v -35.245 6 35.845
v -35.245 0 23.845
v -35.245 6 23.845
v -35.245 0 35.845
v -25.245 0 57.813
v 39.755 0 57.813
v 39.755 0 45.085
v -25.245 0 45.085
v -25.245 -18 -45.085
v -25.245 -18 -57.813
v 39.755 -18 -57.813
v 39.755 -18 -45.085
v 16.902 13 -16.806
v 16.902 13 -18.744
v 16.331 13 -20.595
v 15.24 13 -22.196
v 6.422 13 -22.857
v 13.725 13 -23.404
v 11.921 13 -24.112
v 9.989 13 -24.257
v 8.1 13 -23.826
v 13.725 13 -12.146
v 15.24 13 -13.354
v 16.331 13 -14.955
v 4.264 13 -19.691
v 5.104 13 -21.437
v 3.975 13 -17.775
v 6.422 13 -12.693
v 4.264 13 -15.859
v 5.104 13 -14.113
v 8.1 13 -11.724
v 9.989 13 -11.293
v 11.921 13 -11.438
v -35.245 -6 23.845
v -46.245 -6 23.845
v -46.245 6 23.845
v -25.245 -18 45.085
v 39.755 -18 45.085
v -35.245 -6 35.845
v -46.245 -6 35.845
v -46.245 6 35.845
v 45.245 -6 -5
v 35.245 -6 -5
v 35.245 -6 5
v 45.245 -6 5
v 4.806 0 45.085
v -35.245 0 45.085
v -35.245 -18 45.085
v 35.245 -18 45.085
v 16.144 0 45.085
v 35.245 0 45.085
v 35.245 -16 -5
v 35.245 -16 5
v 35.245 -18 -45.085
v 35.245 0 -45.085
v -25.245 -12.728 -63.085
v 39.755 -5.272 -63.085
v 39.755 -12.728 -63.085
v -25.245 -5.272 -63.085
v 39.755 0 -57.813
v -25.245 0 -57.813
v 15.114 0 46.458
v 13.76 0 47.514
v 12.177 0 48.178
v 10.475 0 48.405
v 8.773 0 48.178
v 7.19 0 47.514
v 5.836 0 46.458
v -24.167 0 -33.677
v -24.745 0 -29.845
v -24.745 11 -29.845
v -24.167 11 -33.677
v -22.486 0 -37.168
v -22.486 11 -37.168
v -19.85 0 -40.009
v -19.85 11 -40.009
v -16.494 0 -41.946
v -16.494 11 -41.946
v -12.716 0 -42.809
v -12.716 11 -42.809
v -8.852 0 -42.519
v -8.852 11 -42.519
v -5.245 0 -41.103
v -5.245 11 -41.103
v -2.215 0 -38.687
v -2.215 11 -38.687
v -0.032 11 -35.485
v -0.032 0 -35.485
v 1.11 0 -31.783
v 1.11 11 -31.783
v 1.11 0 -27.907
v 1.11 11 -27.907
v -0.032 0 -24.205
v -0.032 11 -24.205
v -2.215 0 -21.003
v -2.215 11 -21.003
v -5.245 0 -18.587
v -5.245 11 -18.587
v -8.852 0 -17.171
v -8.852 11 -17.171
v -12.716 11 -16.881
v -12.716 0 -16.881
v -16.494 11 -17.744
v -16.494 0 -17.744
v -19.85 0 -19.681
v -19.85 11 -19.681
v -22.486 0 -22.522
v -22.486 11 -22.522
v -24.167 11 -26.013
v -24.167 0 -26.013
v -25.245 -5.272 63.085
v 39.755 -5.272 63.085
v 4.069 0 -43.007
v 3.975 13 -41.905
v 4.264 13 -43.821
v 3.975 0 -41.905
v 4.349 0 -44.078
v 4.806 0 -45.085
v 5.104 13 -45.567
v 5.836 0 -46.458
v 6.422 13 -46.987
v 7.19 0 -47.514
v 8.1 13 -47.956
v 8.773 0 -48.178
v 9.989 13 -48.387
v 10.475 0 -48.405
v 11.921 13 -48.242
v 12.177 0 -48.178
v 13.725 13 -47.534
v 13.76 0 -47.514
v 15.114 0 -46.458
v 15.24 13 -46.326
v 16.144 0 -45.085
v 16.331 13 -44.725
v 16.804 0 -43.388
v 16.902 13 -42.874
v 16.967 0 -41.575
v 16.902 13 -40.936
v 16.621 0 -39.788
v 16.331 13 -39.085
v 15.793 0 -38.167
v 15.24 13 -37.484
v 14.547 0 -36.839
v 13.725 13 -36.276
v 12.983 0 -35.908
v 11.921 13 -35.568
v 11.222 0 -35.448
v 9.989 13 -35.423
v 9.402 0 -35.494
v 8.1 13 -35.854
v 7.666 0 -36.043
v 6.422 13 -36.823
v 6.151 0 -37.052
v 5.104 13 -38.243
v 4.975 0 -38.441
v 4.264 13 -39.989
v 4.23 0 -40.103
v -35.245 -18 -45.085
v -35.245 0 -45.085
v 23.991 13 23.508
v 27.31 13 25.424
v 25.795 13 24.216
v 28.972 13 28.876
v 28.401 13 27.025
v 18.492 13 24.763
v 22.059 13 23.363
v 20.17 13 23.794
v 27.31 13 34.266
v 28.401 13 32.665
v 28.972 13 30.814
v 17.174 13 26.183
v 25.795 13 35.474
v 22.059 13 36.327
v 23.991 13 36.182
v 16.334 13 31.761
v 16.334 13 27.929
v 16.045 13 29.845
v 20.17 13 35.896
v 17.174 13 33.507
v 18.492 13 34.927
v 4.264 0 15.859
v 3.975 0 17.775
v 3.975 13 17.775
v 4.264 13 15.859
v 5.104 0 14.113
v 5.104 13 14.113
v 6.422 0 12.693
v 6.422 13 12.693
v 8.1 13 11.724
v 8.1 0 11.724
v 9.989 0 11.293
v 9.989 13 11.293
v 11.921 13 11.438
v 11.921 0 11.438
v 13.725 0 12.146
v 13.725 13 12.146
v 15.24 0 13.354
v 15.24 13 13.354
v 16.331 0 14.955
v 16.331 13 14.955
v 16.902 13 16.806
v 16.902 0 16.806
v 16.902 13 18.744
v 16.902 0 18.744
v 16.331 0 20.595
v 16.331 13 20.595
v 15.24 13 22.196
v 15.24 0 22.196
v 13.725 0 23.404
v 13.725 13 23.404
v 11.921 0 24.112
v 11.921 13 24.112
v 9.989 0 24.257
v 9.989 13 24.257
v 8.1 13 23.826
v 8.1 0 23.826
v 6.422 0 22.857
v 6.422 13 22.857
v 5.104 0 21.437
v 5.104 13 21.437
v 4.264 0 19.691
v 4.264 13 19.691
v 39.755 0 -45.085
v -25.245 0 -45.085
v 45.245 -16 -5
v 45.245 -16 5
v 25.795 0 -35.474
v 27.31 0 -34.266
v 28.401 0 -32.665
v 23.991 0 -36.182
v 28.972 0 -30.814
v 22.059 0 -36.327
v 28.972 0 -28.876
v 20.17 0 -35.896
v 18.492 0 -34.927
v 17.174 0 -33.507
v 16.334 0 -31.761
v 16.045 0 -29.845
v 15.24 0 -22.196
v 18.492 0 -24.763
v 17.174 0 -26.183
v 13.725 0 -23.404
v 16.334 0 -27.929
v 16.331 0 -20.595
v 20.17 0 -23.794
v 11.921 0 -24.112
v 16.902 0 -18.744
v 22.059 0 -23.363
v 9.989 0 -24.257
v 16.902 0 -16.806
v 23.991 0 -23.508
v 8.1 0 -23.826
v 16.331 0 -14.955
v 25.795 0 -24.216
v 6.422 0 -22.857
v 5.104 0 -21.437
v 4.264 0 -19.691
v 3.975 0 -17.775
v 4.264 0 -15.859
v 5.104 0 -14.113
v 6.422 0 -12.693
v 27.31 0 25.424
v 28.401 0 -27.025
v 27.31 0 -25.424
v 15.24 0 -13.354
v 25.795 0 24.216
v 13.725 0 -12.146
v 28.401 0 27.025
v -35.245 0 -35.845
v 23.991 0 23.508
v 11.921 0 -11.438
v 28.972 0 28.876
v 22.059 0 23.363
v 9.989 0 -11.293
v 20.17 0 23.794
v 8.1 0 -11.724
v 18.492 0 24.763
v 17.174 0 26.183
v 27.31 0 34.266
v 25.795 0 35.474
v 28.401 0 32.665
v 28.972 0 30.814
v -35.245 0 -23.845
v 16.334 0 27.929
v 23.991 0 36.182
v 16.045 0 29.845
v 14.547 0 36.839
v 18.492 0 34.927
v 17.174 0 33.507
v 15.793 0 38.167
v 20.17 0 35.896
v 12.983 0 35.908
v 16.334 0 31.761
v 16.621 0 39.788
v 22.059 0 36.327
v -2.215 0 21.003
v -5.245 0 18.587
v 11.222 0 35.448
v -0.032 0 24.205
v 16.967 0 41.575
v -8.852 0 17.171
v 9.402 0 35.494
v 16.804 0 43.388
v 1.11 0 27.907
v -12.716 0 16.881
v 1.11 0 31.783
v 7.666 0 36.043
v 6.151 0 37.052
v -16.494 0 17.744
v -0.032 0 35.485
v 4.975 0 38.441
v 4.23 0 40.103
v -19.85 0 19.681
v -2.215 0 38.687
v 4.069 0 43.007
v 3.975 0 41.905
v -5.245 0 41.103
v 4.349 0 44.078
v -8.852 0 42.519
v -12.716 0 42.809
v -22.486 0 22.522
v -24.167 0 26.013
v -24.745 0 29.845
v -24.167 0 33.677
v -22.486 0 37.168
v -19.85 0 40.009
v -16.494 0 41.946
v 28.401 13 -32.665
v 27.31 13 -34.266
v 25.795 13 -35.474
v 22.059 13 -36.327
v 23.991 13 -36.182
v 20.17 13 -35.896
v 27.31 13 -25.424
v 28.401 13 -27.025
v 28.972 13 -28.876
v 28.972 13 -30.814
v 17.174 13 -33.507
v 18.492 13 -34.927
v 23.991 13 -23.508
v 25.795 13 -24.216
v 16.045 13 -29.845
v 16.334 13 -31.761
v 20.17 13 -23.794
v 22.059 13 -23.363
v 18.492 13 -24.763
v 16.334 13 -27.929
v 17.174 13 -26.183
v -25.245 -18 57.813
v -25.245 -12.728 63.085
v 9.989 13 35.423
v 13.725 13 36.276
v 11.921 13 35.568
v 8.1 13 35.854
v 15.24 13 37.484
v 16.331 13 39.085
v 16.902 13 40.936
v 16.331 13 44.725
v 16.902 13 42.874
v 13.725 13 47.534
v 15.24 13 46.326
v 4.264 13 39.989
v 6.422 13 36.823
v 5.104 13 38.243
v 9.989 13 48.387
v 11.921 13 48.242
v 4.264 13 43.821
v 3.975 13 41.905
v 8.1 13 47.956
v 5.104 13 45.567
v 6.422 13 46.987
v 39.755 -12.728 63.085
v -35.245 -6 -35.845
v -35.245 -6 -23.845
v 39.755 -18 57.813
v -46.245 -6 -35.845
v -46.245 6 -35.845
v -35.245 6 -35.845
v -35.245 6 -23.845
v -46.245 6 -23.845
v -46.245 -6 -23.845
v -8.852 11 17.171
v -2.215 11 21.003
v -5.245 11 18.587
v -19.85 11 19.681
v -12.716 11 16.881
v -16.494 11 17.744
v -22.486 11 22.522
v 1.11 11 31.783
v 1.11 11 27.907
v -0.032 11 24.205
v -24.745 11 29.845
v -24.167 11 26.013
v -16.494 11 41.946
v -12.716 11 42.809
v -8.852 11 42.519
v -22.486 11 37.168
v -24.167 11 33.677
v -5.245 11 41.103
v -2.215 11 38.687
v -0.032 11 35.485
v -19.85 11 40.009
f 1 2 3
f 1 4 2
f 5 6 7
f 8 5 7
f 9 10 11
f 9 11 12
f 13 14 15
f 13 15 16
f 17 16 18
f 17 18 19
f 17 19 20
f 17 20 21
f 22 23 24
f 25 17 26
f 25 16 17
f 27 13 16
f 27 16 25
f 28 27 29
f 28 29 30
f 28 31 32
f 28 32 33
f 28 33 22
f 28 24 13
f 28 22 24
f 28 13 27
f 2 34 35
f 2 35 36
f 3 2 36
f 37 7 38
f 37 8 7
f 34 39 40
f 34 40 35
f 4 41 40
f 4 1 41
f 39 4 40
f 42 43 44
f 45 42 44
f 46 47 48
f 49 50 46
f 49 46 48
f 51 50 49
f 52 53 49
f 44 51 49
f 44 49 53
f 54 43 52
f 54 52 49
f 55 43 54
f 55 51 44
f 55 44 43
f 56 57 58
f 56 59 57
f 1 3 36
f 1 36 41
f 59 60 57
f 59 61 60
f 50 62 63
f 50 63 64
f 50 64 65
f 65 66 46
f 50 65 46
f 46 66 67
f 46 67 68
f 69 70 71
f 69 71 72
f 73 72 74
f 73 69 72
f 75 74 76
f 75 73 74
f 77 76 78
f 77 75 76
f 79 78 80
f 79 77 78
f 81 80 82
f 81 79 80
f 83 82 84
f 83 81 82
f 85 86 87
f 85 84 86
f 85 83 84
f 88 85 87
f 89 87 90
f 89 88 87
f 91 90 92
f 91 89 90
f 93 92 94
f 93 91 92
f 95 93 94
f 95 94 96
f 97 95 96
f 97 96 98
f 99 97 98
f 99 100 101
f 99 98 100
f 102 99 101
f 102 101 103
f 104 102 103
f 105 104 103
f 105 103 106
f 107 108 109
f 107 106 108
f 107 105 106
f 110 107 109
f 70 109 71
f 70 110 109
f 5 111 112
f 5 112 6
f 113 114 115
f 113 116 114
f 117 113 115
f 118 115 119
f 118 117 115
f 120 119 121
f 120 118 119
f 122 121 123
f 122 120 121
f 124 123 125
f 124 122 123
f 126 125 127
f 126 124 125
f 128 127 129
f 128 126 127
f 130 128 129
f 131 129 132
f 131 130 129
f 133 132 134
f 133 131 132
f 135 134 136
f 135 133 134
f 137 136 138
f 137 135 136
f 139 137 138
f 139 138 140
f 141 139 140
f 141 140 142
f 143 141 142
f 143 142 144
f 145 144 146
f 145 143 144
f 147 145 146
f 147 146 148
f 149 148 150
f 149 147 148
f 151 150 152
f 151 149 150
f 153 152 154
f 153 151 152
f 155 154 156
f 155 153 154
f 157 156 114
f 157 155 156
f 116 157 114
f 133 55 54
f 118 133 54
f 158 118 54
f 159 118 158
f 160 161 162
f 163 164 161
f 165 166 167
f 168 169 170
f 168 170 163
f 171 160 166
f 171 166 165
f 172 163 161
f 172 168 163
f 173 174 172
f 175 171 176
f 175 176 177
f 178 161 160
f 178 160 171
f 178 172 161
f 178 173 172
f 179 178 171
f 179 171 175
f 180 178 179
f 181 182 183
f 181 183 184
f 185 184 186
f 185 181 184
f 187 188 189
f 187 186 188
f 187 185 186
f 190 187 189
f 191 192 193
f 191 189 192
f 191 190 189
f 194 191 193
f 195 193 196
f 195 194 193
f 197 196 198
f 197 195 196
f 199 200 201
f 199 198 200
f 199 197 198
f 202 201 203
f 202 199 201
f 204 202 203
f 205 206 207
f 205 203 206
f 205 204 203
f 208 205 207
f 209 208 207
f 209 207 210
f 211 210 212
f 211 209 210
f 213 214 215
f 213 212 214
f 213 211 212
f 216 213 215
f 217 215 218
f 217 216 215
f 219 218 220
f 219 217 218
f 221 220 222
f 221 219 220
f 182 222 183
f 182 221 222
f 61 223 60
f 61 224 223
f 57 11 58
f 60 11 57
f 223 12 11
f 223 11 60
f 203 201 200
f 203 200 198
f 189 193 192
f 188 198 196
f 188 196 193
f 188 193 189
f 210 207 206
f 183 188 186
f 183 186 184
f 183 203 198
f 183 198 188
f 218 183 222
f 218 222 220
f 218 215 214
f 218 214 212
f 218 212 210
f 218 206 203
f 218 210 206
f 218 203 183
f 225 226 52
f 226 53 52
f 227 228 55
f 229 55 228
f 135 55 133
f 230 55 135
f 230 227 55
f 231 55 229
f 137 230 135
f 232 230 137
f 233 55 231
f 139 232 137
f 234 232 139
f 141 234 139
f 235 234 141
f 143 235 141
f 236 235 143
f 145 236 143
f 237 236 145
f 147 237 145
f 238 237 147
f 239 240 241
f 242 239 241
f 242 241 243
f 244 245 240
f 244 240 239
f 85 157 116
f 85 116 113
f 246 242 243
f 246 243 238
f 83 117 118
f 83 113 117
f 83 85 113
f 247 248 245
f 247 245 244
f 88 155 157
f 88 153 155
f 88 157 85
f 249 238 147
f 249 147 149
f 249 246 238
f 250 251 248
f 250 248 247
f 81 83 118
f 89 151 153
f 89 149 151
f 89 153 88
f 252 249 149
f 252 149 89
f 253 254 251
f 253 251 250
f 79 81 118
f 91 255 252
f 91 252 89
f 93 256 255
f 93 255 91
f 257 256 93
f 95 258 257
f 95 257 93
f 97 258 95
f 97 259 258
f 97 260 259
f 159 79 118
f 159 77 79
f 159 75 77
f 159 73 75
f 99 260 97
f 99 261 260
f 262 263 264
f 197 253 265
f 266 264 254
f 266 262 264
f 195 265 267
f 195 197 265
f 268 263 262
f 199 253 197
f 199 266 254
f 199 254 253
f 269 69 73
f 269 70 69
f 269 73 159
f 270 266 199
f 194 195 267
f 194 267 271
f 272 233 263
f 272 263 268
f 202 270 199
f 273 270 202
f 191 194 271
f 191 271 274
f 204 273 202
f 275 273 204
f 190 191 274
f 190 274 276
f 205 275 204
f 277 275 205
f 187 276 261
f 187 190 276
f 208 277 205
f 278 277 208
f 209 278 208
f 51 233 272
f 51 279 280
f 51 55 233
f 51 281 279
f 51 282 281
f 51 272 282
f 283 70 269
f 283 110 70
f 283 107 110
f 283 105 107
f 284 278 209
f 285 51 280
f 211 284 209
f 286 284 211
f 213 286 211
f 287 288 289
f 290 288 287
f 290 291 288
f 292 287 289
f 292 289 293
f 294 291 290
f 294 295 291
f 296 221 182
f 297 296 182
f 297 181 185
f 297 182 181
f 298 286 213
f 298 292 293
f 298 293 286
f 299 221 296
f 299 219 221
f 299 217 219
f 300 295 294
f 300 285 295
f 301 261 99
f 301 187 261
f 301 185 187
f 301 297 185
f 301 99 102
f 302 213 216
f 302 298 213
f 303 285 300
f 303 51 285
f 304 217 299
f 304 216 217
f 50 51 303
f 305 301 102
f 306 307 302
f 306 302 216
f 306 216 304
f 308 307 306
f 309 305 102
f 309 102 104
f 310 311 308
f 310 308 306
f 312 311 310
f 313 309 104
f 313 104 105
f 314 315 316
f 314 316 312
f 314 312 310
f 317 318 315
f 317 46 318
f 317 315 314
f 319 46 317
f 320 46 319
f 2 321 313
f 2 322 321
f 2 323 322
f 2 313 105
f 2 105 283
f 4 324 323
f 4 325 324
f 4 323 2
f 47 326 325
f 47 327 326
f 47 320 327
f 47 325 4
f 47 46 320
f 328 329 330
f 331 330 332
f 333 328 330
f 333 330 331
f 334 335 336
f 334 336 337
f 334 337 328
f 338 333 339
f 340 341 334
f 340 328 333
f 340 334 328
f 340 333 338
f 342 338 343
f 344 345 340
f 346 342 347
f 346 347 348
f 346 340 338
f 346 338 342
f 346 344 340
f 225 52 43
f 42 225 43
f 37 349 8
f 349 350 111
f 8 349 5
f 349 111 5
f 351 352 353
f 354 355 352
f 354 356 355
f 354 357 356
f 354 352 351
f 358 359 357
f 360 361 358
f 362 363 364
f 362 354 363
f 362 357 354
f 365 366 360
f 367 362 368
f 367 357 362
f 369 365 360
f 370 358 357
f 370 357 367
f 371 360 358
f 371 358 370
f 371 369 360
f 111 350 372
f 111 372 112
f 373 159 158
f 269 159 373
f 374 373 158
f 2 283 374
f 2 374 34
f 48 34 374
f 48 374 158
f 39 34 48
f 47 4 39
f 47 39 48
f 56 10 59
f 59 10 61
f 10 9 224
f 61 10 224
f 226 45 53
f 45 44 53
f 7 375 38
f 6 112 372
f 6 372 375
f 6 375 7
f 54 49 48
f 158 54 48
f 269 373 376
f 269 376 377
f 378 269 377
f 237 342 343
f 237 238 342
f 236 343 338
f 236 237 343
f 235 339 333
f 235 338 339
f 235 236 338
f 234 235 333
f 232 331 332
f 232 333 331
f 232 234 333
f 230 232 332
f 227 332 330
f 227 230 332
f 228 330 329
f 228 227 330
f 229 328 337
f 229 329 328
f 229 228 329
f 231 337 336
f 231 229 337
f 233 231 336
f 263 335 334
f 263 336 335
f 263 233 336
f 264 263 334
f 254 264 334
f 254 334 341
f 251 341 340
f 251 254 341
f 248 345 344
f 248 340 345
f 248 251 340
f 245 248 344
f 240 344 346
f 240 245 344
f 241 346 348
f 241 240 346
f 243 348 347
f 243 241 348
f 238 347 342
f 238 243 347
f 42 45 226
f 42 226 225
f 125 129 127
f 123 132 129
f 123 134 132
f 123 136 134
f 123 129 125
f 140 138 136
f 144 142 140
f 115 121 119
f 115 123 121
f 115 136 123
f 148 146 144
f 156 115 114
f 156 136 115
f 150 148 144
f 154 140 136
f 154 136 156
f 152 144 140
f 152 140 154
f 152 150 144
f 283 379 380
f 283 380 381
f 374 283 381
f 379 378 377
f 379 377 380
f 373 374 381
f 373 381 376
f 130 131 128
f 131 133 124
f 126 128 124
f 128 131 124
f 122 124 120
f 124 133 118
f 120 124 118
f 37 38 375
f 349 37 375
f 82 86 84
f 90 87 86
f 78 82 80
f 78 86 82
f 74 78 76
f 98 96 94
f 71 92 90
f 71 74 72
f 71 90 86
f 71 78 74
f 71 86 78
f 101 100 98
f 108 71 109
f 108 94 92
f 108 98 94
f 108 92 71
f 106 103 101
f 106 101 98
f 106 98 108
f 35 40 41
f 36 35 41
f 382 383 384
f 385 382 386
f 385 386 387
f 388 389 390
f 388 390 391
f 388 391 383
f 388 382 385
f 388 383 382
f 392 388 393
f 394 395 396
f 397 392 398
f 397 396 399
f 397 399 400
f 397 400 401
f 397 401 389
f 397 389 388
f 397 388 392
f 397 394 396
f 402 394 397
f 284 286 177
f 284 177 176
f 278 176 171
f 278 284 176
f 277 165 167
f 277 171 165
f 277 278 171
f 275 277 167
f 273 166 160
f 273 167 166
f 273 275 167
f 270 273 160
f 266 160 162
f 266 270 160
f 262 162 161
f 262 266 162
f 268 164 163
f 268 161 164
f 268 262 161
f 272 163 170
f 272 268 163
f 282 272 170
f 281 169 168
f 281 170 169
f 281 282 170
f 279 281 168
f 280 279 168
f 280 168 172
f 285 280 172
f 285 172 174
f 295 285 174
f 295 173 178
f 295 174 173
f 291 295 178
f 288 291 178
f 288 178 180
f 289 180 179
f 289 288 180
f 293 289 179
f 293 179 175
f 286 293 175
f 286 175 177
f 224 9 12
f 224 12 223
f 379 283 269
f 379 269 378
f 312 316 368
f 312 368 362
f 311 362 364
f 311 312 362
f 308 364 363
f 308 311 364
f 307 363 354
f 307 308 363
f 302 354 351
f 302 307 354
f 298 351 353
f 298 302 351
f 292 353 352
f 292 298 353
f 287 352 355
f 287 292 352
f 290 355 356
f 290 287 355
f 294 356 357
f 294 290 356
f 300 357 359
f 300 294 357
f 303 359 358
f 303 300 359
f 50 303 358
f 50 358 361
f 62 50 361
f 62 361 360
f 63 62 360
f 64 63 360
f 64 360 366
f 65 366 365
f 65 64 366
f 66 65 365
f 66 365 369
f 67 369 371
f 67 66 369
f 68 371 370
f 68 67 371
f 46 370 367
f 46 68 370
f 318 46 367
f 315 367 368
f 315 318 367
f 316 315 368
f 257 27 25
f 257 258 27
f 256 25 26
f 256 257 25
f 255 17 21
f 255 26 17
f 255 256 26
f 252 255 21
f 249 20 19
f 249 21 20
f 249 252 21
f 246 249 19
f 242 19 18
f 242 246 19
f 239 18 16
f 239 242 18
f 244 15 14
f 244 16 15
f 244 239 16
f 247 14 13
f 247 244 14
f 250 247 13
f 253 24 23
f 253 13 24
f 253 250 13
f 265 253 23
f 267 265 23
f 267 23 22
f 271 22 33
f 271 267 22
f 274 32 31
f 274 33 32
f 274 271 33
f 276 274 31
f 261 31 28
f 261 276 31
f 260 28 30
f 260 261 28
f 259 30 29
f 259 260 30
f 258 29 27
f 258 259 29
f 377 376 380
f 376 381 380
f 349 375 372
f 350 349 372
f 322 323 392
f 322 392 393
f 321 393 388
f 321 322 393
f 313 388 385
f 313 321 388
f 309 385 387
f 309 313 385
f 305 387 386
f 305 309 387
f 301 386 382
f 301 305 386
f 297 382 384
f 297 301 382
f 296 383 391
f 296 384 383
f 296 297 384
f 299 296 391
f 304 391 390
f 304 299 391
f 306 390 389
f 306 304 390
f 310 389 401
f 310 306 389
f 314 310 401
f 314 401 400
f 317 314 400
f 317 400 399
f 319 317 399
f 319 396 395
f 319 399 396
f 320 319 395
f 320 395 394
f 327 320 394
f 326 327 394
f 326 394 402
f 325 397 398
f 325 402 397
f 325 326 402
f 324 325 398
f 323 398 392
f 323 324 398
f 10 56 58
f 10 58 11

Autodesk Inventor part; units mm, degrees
ref_plane "XY Plane" through (0, 0, 0) normal (0, 0, 1) x (1, 0, 0)
sketch "Sketch1" plane through (0, 0, 0) normal (0, 1, 0) x (-1, 0, 0)
  line L0 (35.245, 45.085) -> (-35.245, 45.085)
  line L1 (-35.245, 45.085) -> (-35.245, -45.085)
  line L2 (-35.245, -45.085) -> (35.245, -45.085)
  line L3 (35.245, -45.085) -> (35.245, 45.085)
  circle A0 centre (11.745, 29.845) radius 13
  circle A1 centre (11.745, -29.845) radius 13
  line L4 (-10.475, 45.085) -> (-10.475, -45.085) construction
  circle A2 centre (-10.475, 41.905) radius 6.5
  circle A3 centre (-10.475, 17.775) radius 6.5
  circle A4 centre (-10.475, -17.775) radius 6.5
  circle A5 centre (-10.475, -41.905) radius 6.5
  circle A6 centre (-22.545, 29.845) radius 6.5
  circle A7 centre (-22.545, -29.845) radius 6.5
  point P0 (0, 0)
  dimension "d0" = 90.17
  dimension "d1" = 45.085
  dimension "d2" = 35.245
  dimension "d3" = 70.49
  dimension "d4" = 15.24
  dimension "d5" = 15.24
  dimension "d6" = 23.5
  dimension "d7" = 23.5
  dimension "d8" = 26
  dimension "d9" = 26
  dimension "d10" = 45.72
  dimension "d11" = 13
  dimension "d12" = 13
  dimension "d13" = 13
  dimension "d14" = 13
  dimension "d15" = 3.18
  dimension "d16" = 3.18
  dimension "d17" = 24.13
  dimension "d18" = 24.13
  dimension "d19" = 13
  dimension "d20" = 12.07
  dimension "d21" = 12.07
  dimension "d22" = 0
  dimension "d23" = 0
  dimension "d24" = 13
extrude "Extrusion1" add sketch "Sketch1" along normal blind 11 contours A0 | A1
sketch "Sketch2" plane through (0, 0, 0) normal (0, 1, 0) x (-1, 0, 0)
  line L0 (35.245, 45.085) -> (-35.245, 45.085)
  line L1 (-35.245, 45.085) -> (-35.245, -45.085)
  line L2 (-35.245, -45.085) -> (35.245, -45.085)
  line L3 (35.245, -45.085) -> (35.245, 45.085)
  circle A0 centre (11.745, 29.845) radius 13
  circle A1 centre (11.745, -29.845) radius 13
  line L4 (-10.475, 45.085) -> (-10.475, -45.085) construction
  circle A2 centre (-10.475, 41.905) radius 6.5
  circle A3 centre (-10.475, 17.775) radius 6.5
  circle A4 centre (-10.475, -17.775) radius 6.5
  circle A5 centre (-10.475, -41.905) radius 6.5
  circle A6 centre (-22.545, 29.845) radius 6.5
  circle A7 centre (-22.545, -29.845) radius 6.5
  point P0 (0, 0)
  dimension "d27" = 90.17
  dimension "d28" = 45.085
  dimension "d29" = 35.245
  dimension "d30" = 70.49
  dimension "d31" = 15.24
  dimension "d32" = 15.24
  dimension "d33" = 23.5
  dimension "d34" = 23.5
  dimension "d35" = 26
  dimension "d36" = 26
  dimension "d37" = 45.72
  dimension "d38" = 13
  dimension "d39" = 13
  dimension "d40" = 13
  dimension "d41" = 13
  dimension "d42" = 3.18
  dimension "d43" = 3.18
  dimension "d44" = 24.13
  dimension "d45" = 24.13
  dimension "d46" = 13
  dimension "d47" = 12.07
  dimension "d48" = 12.07
  dimension "d49" = 0
  dimension "d50" = 0
  dimension "d51" = 13
extrude "Extrusion2" add sketch "Sketch2" along normal blind 7 contours A2 L0 | L0 A2 | A5 L2 | L2 A5 | A3 | A4 | A6 | A7
ref_plane "Work Plane1" through (0, 7, 0) normal (0, 1, 0) x (-1, 0, 0)
sketch "Sketch3" plane through (0, 7, 0) normal (0, 1, 0) x (-1, 0, 0)
  line L0 (35.245, 45.085) -> (-35.245, 45.085)
  line L1 (-35.245, 45.085) -> (-35.245, -45.085)
  line L2 (-35.245, -45.085) -> (35.245, -45.085)
  line L3 (35.245, -45.085) -> (35.245, 45.085)
  circle A0 centre (11.745, 29.845) radius 13
  circle A1 centre (11.745, -29.845) radius 13
  line L4 (-10.475, 45.085) -> (-10.475, -45.085) construction
  circle A2 centre (-10.475, 41.905) radius 6.5
  circle A3 centre (-10.475, 17.775) radius 6.5
  circle A4 centre (-10.475, -17.775) radius 6.5
  circle A5 centre (-10.475, -41.905) radius 6.5
  circle A6 centre (-22.545, 29.845) radius 6.5
  circle A7 centre (-22.545, -29.845) radius 6.5
  point P0 (0, 0)
  dimension "d55" = 90.17
  dimension "d56" = 45.085
  dimension "d57" = 35.245
  dimension "d58" = 70.49
  dimension "d59" = 15.24
  dimension "d60" = 15.24
  dimension "d61" = 23.5
  dimension "d62" = 23.5
  dimension "d63" = 26
  dimension "d64" = 26
  dimension "d65" = 45.72
  dimension "d66" = 13
  dimension "d67" = 13
  dimension "d68" = 13
  dimension "d69" = 13
  dimension "d70" = 3.18
  dimension "d71" = 3.18
  dimension "d72" = 24.13
  dimension "d73" = 24.13
  dimension "d74" = 13
  dimension "d75" = 12.07
  dimension "d76" = 12.07
  dimension "d77" = 0
  dimension "d78" = 0
  dimension "d79" = 13
extrude "Extrusion3" add sketch "Sketch3" along normal blind 6 contours A2 L0 | L0 A2 | A5 L2 | L2 A5 | A3 | A4 | A6 | A7
sketch "Sketch4" plane through (0, 0, 0) normal (0, 1, 0) x (-1, 0, 0)
  line L0 (35.245, 45.085) -> (-35.245, 45.085)
  line L1 (-35.245, 45.085) -> (-35.245, -45.085)
  line L2 (-35.245, -45.085) -> (35.245, -45.085)
  line L3 (35.245, -45.085) -> (35.245, 45.085)
  circle A0 centre (11.745, 29.845) radius 13
  circle A1 centre (11.745, -29.845) radius 13
  line L4 (-10.475, 45.085) -> (-10.475, -45.085) construction
  circle A2 centre (-10.475, 41.905) radius 6.5
  circle A3 centre (-10.475, 17.775) radius 6.5
  circle A4 centre (-10.475, -17.775) radius 6.5
  circle A5 centre (-10.475, -41.905) radius 6.5
  circle A6 centre (-22.545, 29.845) radius 6.5
  circle A7 centre (-22.545, -29.845) radius 6.5
  point P0 (0, 0)
  dimension "d82" = 90.17
  dimension "d83" = 45.085
  dimension "d84" = 35.245
  dimension "d85" = 70.49
  dimension "d86" = 15.24
  dimension "d87" = 15.24
  dimension "d88" = 23.5
  dimension "d89" = 23.5
  dimension "d90" = 26
  dimension "d91" = 26
  dimension "d92" = 45.72
  dimension "d93" = 13
  dimension "d94" = 13
  dimension "d95" = 13
  dimension "d96" = 13
  dimension "d97" = 3.18
  dimension "d98" = 3.18
  dimension "d99" = 24.13
  dimension "d100" = 24.13
  dimension "d101" = 13
  dimension "d102" = 12.07
  dimension "d103" = 12.07
  dimension "d104" = 0
  dimension "d105" = 0
  dimension "d106" = 13
extrude "Extrusion4" add sketch "Sketch4" against normal blind 18 contours L3 L2 A5 L1 L0 A2 | A2 L0 | L2 A5 | A0 | A1 | A3 | A4 | A6 | A7 picked at (-10.0855, 41.5356) picked at (-10.2378, -41.8714)
ref_plane "Work Plane2" through (-35.245, 0, 0) normal (1, 0, 0) x (0, 1, 0)
sketch "Sketch6" plane through (-35.245, 0, 0) normal (1, 0, 0) x (0, 1, 0)
  circle A0 centre (0, -29.845) radius 6.5
  circle A1 centre (0, 29.845) radius 6.5
  line L0 (0, -45.085) -> (0, 45.085) projected
  line L1 (6, -23.845) -> (-6, -23.845)
  line L2 (-6, -23.845) -> (-6, -35.845)
  line L3 (-6, -35.845) -> (6, -35.845)
  line L4 (6, -35.845) -> (6, -23.845)
  line L5 (6, 35.845) -> (-6, 35.845)
  line L6 (-6, 35.845) -> (-6, 23.845)
  line L7 (-6, 23.845) -> (6, 23.845)
  line L8 (6, 23.845) -> (6, 35.845)
  point P0 (0, 0)
  dimension "d114" = 13
  dimension "d115" = 13
  dimension "d116" = 59.69
  dimension "d117" = 29.845
  dimension "d149" = 12
  dimension "d150" = 12
  dimension "d151" = 6
  dimension "d152" = 6
  dimension "d153" = 12
  dimension "d154" = 12
  dimension "d155" = 6
  dimension "d156" = 6
extrude "Extrusion5" add sketch "Sketch6" against normal blind 7 contours L4 A0 L3 L0 L1 | A0 L1 L4 | L4 L3 A0 | L0 L3 A0 L2 L1 | A0 L2 L1 | L3 L2 A0 | L8 A1 L7 L0 L5 | A1 L5 L8 | L8 L7 A1 | L0 L7 A1 L6 L5 | A1 L6 L5 | L7 L6 A1
ref_plane "Work Plane3" through (-42.245, 0, 0) normal (1, 0, 0) x (0, 1, 0)
sketch "Sketch8" plane through (-35.245, 0, 0) normal (1, 0, 0) x (0, 1, 0)
  circle A0 centre (-9, 54.085) radius 9
  circle A1 centre (-9, -54.085) radius 9
  line L0 (0, 45.085) -> (-18, 45.085) projected
  line L1 (0, -45.085) -> (-18, -45.085) projected
  line L2 (0, 63.085) -> (-18, 63.085)
  line L3 (-18, 63.085) -> (-18, 45.085)
  line L4 (-18, 45.085) -> (0, 45.085)
  line L5 (0, 45.085) -> (0, 63.085)
  line L6 (-5.2721, 63.085) -> (0, 57.8129)
  line L7 (-12.7279, 63.085) -> (-18, 57.8129)
  line L8 (0, -48.405) -> (0, -45.085) projected
  line L9 (-18, -63.085) -> (0, -63.085)
  line L10 (0, -63.085) -> (0, -45.085)
  line L11 (0, -45.085) -> (-18, -45.085)
  line L12 (-18, -45.085) -> (-18, -63.085)
  line L13 (-5.2721, -63.085) -> (0, -57.8129)
  line L14 (-12.7279, -63.085) -> (-18, -57.8129)
  point P0 (0, 0)
  point P1 (-18, 54.085)
  point P2 (-9, 45.085)
  point P3 (-2.636, 60.449)
  point P4 (-9, 63.085)
  point P5 (0, 54.085)
  point P6 (-15.364, 60.449)
  point P7 (-15.364, -60.449)
  point P8 (-18, -54.085)
  point P9 (-2.636, -60.449)
  point P10 (0, -54.085)
  point P11 (-9, -63.085)
  point P12 (-9, -45.085)
  dimension "d127" = 18
  dimension "d128" = 18
  dimension "d129" = 9
  dimension "d130" = 9
  dimension "d1540" = 45
  dimension "d1541" = 45
  dimension "d1542" = 45
  dimension "d1543" = 45
extrude "Extrusion7" add sketch "Sketch8" along normal blind 65 separate body contours A0 | L5 L0 A0 | A0 L6 L5 | A0 L2 L6 | L0 L3 A0 | A0 L7 L2 | L3 L7 A0 | A1 | L10 L13 A1 | A1 L1 L8 L10 | A1 L12 L1 | L13 L9 A1 | A1 L14 L12 | L9 L14 A1
sketch "Sketch9" plane through (0, 7, 0) normal (0, 1, 0) x (-1, 0, 0)
  line L0 (25.245, 13.5) -> (-1.755, 13.5)
  line L1 (-1.755, 13.5) -> (-1.755, -13.5)
  line L2 (-1.755, -13.5) -> (25.245, -13.5)
  line L3 (25.245, -13.5) -> (25.245, 13.5)
  circle A0 centre (11.745, 29.845) radius 13 projected
  circle A1 centre (11.745, 29.845) radius 13
  point P0 (0, 0)
  dimension "d133" = 27
  dimension "d134" = 27
  dimension "d135" = 13.5
  dimension "d136" = 13.5
sketch "Sketch10" plane through (35.245, 0, 45.085) normal (1, 0, 0) x (0, 0, -1)
  line L0 (40.085, -16) -> (50.085, -16)
  line L1 (50.085, -16) -> (50.085, -6)
  line L2 (50.085, -6) -> (40.085, -6)
  line L3 (40.085, -6) -> (40.085, -16)
  line L4 (0, 0) -> (90.17, 0) projected
  point P0 (45.085, 0)
  dimension "d137" = 10
  dimension "d138" = 10
  dimension "d140" = 5
  dimension "d171" = 6
extrude "Extrusion8" add sketch "Sketch10" along normal blind 7 bodies 1
sketch "Sketch11" plane through (42.245, 0, 45.085) normal (1, 0, 0) x (0, 0, -1)
  line L0 (40.085, -16) -> (50.085, -16)
  line L1 (50.085, -16) -> (50.085, -6)
  line L2 (50.085, -6) -> (40.085, -6)
  line L3 (40.085, -6) -> (40.085, -16)
  line L4 (0, 0) -> (90.17, 0) projected
  point P0 (45.085, 0)
  dimension "d143" = 10
  dimension "d144" = 10
  dimension "d146" = 5
  dimension "d172" = 6
extrude "Extrusion9" add sketch "Sketch11" along normal blind 3 bodies 1
sketch "Sketch12" plane through (-42.245, 0, 0) normal (1, 0, 0) x (0, 1, 0)
  circle A0 centre (0, -29.845) radius 6.5
  circle A1 centre (0, 29.845) radius 6.5
  line L0 (6, -23.845) -> (-6, -23.845)
  line L1 (-6, -23.845) -> (-6, -35.845)
  line L2 (-6, -35.845) -> (6, -35.845)
  line L3 (6, -35.845) -> (6, -23.845)
  line L4 (6, 35.845) -> (-6, 35.845)
  line L5 (-6, 35.845) -> (-6, 23.845)
  line L6 (-6, 23.845) -> (6, 23.845)
  line L7 (6, 23.845) -> (6, 35.845)
  point P0 (0, 0)
  dimension "d157" = 13
  dimension "d158" = 13
  dimension "d159" = 59.69
  dimension "d160" = 29.845
  dimension "d161" = 12
  dimension "d162" = 12
  dimension "d163" = 6
  dimension "d164" = 6
  dimension "d165" = 12
  dimension "d166" = 12
  dimension "d167" = 6
  dimension "d168" = 6
extrude "Extrusion10" add sketch "Sketch12" against normal blind 4 contours L3 A0 L2 L1 L0 | A0 L0 L3 | L3 L2 A0 | A0 L1 L0 | L2 L1 A0 | L7 A1 L6 L5 L4 | A1 L4 L7 | L7 L6 A1 | A1 L5 L4 | L6 L5 A1 bodies 1
move faces "Move20" translate (10, 0, 0) faces at (-35.245, -6, 53.5703)
move faces "Move21" translate (10, 0, 0) faces at (29.755, -6, 53.5703)
move faces "Move22" translate (10, 0, 0) faces at (29.755, -12, -53.5703)
move faces "Move23" translate (10, 0, 0) faces at (-35.245, -12, -53.5703)
properties part number "Obudowa_v1_srodek"
